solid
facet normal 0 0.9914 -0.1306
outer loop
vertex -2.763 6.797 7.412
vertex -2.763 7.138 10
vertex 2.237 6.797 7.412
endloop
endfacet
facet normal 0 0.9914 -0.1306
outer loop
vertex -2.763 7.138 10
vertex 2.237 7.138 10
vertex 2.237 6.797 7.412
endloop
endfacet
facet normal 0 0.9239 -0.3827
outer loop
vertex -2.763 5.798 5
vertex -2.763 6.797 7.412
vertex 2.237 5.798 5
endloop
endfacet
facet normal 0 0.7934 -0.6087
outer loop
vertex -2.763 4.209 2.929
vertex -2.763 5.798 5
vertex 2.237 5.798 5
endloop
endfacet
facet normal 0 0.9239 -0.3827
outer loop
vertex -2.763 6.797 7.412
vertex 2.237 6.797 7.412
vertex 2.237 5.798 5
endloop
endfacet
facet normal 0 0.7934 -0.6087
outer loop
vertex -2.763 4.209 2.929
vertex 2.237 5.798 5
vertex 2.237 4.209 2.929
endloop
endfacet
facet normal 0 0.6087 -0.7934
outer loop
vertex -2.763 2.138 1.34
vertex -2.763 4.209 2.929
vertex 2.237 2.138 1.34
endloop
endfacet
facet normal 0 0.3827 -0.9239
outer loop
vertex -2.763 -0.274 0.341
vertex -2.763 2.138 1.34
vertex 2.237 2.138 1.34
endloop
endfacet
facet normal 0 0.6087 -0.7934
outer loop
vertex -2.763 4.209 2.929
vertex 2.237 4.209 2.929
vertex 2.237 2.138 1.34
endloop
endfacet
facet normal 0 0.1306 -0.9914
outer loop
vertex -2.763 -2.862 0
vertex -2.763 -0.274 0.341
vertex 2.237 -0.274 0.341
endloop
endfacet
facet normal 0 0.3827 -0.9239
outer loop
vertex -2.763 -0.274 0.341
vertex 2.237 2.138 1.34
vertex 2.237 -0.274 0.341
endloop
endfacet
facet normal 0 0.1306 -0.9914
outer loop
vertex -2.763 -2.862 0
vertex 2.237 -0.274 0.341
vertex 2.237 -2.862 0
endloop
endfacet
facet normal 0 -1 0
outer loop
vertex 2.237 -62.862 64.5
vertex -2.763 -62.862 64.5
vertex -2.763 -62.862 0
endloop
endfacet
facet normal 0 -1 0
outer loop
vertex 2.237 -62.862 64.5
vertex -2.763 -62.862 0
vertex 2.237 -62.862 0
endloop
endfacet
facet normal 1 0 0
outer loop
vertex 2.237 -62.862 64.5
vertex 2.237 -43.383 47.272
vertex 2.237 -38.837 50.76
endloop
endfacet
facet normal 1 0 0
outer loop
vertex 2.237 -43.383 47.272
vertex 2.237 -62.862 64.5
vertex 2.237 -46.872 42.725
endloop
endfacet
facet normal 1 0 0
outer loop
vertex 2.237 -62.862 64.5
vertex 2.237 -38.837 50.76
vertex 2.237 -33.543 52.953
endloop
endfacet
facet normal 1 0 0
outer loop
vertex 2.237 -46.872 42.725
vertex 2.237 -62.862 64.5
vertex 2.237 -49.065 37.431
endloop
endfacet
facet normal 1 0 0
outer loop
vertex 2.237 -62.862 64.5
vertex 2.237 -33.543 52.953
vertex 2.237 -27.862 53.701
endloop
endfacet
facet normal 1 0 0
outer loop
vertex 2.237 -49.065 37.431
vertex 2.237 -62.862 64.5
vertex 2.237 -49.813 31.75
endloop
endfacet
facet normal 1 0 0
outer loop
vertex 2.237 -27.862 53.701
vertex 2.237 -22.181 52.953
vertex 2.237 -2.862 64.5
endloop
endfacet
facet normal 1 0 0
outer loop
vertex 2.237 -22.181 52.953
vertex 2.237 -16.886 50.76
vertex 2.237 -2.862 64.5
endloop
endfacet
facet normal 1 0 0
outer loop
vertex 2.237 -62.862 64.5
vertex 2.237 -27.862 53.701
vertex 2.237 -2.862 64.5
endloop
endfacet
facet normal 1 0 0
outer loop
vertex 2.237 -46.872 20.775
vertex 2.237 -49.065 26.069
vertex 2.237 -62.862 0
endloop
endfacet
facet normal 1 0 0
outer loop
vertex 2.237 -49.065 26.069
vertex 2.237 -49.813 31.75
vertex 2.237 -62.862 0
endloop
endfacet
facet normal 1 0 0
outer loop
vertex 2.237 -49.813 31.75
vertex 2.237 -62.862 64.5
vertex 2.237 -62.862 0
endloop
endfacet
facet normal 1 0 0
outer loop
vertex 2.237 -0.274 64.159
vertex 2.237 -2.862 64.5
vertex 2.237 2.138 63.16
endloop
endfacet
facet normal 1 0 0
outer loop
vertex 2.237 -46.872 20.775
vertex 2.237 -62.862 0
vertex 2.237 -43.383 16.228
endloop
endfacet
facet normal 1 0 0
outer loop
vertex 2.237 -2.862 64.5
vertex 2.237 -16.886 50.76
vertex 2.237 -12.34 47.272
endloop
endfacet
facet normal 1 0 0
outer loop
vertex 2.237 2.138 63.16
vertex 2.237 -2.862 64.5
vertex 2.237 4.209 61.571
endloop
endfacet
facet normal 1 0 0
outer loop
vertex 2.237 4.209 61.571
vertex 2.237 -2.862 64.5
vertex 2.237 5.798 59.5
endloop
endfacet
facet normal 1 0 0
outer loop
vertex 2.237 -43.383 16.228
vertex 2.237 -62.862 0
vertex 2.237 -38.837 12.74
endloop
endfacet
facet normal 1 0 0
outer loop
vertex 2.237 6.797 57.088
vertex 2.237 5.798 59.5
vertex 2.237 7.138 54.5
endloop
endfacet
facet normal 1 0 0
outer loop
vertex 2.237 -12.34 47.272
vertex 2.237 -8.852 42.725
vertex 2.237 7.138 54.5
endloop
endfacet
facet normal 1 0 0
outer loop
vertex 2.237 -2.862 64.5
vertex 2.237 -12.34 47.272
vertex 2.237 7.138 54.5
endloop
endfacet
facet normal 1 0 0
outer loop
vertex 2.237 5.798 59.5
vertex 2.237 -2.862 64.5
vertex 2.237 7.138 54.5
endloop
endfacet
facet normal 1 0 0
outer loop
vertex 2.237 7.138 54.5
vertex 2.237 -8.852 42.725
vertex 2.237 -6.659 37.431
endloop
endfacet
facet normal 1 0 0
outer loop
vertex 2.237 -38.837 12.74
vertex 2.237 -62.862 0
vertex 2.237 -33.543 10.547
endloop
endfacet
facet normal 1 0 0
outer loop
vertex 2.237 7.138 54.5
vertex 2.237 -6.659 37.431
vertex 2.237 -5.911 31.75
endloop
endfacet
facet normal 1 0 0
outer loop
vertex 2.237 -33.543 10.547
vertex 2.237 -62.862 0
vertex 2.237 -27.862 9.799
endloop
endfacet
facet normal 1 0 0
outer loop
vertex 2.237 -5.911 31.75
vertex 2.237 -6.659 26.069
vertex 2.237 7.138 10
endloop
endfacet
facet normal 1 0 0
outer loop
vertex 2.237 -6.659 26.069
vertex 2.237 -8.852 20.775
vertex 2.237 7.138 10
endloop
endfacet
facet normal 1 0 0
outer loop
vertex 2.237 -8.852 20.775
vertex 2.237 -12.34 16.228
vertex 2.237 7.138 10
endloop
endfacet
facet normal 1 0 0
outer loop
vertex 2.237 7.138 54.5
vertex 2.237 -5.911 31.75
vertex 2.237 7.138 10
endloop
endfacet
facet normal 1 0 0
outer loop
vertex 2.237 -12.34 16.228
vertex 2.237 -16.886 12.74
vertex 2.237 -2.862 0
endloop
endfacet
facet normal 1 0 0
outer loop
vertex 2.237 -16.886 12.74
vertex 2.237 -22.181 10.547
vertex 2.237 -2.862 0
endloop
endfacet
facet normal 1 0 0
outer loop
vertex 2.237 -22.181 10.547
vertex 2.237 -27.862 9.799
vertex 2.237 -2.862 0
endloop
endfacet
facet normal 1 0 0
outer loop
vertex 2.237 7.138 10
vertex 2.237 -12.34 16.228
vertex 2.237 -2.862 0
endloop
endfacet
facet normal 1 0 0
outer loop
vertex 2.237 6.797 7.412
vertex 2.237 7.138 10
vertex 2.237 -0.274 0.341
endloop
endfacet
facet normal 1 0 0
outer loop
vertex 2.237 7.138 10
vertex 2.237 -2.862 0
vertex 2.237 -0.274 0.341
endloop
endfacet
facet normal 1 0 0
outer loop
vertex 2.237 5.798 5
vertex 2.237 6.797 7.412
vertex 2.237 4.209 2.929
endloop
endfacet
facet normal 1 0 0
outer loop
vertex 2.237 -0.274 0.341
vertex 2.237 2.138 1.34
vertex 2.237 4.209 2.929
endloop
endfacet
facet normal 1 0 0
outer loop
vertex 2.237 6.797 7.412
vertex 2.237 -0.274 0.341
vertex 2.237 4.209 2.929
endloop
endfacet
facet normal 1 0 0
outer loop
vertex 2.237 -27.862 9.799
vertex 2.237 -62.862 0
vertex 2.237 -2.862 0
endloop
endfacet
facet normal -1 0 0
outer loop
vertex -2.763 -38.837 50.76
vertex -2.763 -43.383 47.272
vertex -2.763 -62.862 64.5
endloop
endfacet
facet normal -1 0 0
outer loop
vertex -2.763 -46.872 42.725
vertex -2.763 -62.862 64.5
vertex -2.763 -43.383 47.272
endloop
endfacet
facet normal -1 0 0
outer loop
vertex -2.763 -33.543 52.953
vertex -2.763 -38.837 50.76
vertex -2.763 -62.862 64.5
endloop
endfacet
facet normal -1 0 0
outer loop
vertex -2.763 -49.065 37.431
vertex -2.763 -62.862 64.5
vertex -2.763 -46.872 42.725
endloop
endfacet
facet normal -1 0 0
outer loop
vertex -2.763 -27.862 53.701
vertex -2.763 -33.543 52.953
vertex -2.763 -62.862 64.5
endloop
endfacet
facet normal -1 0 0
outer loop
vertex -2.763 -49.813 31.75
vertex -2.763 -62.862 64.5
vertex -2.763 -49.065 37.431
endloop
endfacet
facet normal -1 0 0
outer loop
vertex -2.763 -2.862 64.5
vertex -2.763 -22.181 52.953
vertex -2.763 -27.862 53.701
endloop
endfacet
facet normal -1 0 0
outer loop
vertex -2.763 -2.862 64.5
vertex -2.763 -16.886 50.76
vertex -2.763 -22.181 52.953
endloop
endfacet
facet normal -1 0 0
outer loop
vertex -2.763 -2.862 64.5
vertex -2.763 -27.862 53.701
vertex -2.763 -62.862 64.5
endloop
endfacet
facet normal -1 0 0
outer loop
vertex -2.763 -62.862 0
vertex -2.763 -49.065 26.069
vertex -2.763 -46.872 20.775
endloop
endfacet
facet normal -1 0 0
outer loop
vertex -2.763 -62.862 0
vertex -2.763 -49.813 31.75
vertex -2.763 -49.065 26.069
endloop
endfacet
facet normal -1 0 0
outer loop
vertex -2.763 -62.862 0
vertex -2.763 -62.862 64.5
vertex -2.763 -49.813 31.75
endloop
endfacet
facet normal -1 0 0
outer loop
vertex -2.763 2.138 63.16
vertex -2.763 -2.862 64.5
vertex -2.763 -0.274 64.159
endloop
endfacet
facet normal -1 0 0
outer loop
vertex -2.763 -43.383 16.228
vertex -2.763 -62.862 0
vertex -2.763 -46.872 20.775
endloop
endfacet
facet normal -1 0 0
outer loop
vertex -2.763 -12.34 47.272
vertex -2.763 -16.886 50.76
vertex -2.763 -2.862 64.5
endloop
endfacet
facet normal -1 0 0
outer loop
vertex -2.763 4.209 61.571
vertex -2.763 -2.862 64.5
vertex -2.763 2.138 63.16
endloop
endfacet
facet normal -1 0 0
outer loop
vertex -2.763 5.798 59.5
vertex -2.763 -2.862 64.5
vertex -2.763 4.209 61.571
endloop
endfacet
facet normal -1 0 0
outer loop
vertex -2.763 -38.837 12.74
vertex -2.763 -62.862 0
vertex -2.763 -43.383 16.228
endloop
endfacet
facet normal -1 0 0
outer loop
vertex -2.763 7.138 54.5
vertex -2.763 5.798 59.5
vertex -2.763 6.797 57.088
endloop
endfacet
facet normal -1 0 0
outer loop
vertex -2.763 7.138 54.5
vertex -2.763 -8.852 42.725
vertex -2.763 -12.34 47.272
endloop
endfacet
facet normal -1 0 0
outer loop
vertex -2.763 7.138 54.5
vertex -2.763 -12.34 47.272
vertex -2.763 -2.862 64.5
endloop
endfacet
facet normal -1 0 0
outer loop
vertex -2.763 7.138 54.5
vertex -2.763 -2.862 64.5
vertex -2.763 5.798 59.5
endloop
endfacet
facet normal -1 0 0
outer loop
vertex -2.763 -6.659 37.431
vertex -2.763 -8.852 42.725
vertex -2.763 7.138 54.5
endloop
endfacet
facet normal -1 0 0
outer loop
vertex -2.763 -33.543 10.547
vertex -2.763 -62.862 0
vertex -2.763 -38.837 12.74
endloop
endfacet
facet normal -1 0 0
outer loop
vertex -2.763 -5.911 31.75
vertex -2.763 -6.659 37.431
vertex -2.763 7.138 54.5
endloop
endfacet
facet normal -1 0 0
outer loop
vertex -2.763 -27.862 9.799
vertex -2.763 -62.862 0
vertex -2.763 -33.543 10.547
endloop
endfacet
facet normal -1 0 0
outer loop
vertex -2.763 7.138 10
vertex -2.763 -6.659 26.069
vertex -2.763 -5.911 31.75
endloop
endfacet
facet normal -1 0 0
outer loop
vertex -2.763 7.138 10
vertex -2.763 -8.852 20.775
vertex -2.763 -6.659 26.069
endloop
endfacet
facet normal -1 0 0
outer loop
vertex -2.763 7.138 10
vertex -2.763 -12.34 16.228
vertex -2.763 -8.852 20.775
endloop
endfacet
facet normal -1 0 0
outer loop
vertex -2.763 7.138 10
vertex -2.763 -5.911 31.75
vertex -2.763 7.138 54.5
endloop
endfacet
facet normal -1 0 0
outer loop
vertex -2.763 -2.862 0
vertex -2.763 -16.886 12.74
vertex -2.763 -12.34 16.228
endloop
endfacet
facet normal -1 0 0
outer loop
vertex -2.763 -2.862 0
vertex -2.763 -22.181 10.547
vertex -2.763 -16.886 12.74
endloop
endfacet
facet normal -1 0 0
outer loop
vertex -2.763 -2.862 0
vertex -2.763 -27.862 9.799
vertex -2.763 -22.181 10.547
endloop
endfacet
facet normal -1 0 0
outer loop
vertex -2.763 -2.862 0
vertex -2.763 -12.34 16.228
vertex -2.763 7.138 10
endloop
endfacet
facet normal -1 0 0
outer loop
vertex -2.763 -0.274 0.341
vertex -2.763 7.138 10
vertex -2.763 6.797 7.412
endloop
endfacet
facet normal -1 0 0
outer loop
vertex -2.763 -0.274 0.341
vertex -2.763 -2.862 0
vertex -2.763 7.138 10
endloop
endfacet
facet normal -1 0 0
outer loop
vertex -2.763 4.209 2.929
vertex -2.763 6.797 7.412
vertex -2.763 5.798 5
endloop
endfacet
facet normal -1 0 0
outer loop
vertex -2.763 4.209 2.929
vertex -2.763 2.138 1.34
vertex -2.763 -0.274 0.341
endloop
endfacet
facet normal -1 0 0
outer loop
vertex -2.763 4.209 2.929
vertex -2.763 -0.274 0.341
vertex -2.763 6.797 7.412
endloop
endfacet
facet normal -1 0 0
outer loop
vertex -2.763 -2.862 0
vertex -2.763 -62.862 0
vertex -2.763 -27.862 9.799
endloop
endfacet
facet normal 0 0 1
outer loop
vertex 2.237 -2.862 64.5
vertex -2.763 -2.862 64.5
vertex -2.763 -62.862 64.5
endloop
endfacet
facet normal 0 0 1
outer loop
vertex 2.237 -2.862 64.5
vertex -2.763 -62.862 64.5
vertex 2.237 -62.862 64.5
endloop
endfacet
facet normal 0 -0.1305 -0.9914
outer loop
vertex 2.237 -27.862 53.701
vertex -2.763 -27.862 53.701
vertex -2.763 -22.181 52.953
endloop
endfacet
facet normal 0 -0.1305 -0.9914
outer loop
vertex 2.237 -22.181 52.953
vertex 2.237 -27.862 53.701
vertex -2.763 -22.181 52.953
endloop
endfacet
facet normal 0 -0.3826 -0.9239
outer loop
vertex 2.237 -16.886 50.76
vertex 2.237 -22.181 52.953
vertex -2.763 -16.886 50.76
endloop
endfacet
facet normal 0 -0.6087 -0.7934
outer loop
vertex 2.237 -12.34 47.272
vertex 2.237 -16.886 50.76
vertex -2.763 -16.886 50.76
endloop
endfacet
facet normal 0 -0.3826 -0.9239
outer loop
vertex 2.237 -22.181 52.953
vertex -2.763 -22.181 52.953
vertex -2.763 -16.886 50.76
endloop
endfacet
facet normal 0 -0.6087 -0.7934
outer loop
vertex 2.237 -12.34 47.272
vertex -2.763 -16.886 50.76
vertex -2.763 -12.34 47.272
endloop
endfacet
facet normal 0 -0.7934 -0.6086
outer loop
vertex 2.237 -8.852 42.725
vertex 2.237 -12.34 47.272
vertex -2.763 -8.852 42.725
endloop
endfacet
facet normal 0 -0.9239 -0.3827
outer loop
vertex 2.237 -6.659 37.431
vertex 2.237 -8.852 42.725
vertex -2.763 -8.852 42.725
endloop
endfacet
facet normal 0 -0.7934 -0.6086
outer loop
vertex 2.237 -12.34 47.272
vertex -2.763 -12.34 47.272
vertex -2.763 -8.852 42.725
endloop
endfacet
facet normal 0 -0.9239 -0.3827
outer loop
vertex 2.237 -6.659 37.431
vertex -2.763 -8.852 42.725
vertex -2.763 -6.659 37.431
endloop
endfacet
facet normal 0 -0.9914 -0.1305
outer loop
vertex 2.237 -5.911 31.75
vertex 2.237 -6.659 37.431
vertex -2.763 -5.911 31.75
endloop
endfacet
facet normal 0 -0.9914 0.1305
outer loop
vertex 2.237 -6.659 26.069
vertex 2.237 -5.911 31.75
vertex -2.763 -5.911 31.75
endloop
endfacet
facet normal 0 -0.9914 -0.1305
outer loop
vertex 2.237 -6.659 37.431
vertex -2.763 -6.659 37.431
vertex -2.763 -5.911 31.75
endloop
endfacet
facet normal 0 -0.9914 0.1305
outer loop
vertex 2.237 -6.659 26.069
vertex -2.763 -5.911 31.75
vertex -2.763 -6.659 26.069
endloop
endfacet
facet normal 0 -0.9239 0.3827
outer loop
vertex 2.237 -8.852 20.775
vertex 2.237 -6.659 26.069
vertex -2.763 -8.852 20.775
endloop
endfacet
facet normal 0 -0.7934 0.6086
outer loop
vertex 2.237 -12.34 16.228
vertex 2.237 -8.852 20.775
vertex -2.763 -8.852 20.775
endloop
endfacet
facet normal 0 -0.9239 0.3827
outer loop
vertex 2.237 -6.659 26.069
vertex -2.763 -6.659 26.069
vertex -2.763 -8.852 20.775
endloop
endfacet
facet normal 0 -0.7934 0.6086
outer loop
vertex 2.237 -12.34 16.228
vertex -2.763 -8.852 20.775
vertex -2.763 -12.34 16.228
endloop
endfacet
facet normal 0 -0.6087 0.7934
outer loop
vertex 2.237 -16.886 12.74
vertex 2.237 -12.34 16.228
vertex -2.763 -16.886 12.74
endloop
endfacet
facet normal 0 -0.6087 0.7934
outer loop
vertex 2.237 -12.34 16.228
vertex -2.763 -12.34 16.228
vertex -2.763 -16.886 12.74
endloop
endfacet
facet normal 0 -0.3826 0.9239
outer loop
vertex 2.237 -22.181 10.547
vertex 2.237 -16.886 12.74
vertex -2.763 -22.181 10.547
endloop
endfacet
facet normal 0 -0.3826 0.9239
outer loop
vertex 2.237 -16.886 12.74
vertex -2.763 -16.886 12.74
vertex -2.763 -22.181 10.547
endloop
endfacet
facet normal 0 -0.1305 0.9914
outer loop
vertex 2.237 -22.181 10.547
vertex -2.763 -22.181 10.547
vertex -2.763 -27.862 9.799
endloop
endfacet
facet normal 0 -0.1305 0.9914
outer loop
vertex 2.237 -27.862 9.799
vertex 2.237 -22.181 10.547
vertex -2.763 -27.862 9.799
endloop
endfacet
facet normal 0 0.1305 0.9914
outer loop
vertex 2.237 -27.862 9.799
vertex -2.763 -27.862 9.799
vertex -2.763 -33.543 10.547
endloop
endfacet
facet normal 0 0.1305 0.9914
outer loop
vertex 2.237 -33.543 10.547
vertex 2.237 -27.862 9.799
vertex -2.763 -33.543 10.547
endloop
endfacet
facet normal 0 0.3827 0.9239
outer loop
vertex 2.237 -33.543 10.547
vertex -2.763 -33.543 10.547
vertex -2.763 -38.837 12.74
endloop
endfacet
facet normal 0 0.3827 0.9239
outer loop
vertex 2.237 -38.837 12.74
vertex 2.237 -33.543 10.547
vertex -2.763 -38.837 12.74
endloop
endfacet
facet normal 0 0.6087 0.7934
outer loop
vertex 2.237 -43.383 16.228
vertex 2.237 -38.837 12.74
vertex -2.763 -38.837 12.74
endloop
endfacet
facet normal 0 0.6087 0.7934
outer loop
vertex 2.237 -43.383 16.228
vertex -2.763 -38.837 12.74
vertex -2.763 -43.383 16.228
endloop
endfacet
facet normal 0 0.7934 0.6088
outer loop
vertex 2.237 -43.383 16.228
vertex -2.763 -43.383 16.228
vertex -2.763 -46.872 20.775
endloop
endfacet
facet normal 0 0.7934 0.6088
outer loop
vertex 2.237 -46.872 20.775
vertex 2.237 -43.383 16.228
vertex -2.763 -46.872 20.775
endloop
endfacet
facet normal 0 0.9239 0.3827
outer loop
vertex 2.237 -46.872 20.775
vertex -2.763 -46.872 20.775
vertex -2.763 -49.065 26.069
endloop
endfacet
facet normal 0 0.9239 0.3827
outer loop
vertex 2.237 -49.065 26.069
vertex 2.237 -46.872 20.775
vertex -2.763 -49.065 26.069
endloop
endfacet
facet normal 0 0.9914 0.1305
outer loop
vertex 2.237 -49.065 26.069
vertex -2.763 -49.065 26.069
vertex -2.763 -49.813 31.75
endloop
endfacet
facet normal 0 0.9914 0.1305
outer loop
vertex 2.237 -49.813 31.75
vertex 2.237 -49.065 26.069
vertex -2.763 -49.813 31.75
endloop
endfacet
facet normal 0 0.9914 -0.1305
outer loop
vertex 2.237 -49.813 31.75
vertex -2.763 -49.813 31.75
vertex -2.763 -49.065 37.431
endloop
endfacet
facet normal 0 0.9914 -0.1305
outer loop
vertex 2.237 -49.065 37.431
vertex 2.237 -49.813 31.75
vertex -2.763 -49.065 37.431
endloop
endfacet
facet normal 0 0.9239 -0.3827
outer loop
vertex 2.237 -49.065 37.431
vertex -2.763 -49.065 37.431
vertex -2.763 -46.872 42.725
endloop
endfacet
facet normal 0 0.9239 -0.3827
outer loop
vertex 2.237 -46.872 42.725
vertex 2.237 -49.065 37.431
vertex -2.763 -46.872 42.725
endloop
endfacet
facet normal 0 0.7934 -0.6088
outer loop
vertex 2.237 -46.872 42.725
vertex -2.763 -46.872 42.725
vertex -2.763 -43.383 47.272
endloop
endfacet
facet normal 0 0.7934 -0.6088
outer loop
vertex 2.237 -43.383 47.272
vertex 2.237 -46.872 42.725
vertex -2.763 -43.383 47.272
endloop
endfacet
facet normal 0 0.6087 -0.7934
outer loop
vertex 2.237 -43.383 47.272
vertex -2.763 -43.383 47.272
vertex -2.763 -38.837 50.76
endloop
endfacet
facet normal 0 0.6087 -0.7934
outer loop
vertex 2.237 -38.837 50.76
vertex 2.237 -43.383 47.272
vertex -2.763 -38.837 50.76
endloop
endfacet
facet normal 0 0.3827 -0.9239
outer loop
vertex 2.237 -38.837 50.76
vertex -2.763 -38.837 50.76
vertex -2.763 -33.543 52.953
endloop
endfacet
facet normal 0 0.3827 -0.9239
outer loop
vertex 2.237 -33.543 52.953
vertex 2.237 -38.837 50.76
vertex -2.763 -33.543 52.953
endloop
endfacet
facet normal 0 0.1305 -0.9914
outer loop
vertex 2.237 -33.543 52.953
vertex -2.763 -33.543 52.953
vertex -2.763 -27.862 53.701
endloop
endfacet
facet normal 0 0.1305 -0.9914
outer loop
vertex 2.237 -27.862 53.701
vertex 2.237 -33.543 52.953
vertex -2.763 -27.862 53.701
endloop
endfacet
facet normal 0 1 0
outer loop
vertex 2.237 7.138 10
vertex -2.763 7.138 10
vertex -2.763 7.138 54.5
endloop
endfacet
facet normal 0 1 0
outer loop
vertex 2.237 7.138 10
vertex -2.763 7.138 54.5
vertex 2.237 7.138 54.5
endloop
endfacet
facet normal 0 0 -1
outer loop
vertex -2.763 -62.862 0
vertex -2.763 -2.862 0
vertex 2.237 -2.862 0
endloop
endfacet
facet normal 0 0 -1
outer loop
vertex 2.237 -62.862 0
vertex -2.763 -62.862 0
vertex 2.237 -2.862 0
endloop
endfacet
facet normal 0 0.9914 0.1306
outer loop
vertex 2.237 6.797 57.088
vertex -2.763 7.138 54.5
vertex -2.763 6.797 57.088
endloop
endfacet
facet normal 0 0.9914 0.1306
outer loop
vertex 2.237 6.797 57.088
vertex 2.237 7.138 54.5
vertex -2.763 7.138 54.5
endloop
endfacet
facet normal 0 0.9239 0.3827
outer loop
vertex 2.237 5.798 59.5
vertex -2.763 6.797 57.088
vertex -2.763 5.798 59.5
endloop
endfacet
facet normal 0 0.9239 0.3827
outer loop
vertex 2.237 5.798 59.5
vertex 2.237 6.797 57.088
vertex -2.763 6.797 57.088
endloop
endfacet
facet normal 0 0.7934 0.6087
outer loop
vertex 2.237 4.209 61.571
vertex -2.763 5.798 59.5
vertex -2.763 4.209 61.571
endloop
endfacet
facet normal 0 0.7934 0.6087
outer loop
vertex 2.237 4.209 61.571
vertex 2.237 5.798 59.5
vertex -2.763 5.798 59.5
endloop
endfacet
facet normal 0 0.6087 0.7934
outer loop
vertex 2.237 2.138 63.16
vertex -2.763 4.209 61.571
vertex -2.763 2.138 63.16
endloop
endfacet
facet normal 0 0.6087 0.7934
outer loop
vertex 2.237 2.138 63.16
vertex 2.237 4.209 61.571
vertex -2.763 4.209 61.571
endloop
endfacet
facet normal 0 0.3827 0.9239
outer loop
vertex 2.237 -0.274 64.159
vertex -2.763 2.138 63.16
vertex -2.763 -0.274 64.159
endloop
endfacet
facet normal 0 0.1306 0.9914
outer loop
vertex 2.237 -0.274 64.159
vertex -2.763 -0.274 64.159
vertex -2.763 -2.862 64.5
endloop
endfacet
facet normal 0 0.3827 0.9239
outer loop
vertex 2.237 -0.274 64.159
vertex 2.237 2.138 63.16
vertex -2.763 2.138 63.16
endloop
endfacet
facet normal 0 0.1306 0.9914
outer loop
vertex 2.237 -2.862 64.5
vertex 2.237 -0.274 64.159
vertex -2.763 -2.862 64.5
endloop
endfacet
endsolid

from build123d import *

# Parameters (mm, degrees)
SKETCH4_W           = 5
SKETCH4_H           = 70
BOSS_EXTRUDE1_DEPTH = 64.5
FILLET3_R           = 10
FILLET4_R           = 10
SKETCH5_R           = 21.9509271
CUT_EXTRUDE1_DEPTH  = 10


with BuildPart() as part:
    # Sketch4 → Boss-Extrude1 (new body)
    with BuildSketch(Plane.XY):
        with Locations((-0.263157895, -27.861842105)):
            Rectangle(SKETCH4_W, SKETCH4_H)
    extrude(amount=BOSS_EXTRUDE1_DEPTH)

    # Fillet3
    fillet3_edges = [part.edges().sort_by_distance(p)[0] for p in [
        (-0.263157895, 7.138157895, 64.5),
    ]]
    fillet(fillet3_edges, radius=FILLET3_R)

    # Fillet4
    fillet4_edges = [part.edges().sort_by_distance(p)[0] for p in [
        (-0.263157895, 7.138157895, 0),
    ]]
    fillet(fillet4_edges, radius=FILLET4_R)

    # Sketch5 → Cut-Extrude1 (cut)
    with BuildSketch(Plane.ZY.offset(2.763157895)):
        with Locations((31.75, -27.861842105)):
            Circle(SKETCH5_R)
    extrude(amount=-CUT_EXTRUDE1_DEPTH, mode=Mode.SUBTRACT)


solid = part.part
